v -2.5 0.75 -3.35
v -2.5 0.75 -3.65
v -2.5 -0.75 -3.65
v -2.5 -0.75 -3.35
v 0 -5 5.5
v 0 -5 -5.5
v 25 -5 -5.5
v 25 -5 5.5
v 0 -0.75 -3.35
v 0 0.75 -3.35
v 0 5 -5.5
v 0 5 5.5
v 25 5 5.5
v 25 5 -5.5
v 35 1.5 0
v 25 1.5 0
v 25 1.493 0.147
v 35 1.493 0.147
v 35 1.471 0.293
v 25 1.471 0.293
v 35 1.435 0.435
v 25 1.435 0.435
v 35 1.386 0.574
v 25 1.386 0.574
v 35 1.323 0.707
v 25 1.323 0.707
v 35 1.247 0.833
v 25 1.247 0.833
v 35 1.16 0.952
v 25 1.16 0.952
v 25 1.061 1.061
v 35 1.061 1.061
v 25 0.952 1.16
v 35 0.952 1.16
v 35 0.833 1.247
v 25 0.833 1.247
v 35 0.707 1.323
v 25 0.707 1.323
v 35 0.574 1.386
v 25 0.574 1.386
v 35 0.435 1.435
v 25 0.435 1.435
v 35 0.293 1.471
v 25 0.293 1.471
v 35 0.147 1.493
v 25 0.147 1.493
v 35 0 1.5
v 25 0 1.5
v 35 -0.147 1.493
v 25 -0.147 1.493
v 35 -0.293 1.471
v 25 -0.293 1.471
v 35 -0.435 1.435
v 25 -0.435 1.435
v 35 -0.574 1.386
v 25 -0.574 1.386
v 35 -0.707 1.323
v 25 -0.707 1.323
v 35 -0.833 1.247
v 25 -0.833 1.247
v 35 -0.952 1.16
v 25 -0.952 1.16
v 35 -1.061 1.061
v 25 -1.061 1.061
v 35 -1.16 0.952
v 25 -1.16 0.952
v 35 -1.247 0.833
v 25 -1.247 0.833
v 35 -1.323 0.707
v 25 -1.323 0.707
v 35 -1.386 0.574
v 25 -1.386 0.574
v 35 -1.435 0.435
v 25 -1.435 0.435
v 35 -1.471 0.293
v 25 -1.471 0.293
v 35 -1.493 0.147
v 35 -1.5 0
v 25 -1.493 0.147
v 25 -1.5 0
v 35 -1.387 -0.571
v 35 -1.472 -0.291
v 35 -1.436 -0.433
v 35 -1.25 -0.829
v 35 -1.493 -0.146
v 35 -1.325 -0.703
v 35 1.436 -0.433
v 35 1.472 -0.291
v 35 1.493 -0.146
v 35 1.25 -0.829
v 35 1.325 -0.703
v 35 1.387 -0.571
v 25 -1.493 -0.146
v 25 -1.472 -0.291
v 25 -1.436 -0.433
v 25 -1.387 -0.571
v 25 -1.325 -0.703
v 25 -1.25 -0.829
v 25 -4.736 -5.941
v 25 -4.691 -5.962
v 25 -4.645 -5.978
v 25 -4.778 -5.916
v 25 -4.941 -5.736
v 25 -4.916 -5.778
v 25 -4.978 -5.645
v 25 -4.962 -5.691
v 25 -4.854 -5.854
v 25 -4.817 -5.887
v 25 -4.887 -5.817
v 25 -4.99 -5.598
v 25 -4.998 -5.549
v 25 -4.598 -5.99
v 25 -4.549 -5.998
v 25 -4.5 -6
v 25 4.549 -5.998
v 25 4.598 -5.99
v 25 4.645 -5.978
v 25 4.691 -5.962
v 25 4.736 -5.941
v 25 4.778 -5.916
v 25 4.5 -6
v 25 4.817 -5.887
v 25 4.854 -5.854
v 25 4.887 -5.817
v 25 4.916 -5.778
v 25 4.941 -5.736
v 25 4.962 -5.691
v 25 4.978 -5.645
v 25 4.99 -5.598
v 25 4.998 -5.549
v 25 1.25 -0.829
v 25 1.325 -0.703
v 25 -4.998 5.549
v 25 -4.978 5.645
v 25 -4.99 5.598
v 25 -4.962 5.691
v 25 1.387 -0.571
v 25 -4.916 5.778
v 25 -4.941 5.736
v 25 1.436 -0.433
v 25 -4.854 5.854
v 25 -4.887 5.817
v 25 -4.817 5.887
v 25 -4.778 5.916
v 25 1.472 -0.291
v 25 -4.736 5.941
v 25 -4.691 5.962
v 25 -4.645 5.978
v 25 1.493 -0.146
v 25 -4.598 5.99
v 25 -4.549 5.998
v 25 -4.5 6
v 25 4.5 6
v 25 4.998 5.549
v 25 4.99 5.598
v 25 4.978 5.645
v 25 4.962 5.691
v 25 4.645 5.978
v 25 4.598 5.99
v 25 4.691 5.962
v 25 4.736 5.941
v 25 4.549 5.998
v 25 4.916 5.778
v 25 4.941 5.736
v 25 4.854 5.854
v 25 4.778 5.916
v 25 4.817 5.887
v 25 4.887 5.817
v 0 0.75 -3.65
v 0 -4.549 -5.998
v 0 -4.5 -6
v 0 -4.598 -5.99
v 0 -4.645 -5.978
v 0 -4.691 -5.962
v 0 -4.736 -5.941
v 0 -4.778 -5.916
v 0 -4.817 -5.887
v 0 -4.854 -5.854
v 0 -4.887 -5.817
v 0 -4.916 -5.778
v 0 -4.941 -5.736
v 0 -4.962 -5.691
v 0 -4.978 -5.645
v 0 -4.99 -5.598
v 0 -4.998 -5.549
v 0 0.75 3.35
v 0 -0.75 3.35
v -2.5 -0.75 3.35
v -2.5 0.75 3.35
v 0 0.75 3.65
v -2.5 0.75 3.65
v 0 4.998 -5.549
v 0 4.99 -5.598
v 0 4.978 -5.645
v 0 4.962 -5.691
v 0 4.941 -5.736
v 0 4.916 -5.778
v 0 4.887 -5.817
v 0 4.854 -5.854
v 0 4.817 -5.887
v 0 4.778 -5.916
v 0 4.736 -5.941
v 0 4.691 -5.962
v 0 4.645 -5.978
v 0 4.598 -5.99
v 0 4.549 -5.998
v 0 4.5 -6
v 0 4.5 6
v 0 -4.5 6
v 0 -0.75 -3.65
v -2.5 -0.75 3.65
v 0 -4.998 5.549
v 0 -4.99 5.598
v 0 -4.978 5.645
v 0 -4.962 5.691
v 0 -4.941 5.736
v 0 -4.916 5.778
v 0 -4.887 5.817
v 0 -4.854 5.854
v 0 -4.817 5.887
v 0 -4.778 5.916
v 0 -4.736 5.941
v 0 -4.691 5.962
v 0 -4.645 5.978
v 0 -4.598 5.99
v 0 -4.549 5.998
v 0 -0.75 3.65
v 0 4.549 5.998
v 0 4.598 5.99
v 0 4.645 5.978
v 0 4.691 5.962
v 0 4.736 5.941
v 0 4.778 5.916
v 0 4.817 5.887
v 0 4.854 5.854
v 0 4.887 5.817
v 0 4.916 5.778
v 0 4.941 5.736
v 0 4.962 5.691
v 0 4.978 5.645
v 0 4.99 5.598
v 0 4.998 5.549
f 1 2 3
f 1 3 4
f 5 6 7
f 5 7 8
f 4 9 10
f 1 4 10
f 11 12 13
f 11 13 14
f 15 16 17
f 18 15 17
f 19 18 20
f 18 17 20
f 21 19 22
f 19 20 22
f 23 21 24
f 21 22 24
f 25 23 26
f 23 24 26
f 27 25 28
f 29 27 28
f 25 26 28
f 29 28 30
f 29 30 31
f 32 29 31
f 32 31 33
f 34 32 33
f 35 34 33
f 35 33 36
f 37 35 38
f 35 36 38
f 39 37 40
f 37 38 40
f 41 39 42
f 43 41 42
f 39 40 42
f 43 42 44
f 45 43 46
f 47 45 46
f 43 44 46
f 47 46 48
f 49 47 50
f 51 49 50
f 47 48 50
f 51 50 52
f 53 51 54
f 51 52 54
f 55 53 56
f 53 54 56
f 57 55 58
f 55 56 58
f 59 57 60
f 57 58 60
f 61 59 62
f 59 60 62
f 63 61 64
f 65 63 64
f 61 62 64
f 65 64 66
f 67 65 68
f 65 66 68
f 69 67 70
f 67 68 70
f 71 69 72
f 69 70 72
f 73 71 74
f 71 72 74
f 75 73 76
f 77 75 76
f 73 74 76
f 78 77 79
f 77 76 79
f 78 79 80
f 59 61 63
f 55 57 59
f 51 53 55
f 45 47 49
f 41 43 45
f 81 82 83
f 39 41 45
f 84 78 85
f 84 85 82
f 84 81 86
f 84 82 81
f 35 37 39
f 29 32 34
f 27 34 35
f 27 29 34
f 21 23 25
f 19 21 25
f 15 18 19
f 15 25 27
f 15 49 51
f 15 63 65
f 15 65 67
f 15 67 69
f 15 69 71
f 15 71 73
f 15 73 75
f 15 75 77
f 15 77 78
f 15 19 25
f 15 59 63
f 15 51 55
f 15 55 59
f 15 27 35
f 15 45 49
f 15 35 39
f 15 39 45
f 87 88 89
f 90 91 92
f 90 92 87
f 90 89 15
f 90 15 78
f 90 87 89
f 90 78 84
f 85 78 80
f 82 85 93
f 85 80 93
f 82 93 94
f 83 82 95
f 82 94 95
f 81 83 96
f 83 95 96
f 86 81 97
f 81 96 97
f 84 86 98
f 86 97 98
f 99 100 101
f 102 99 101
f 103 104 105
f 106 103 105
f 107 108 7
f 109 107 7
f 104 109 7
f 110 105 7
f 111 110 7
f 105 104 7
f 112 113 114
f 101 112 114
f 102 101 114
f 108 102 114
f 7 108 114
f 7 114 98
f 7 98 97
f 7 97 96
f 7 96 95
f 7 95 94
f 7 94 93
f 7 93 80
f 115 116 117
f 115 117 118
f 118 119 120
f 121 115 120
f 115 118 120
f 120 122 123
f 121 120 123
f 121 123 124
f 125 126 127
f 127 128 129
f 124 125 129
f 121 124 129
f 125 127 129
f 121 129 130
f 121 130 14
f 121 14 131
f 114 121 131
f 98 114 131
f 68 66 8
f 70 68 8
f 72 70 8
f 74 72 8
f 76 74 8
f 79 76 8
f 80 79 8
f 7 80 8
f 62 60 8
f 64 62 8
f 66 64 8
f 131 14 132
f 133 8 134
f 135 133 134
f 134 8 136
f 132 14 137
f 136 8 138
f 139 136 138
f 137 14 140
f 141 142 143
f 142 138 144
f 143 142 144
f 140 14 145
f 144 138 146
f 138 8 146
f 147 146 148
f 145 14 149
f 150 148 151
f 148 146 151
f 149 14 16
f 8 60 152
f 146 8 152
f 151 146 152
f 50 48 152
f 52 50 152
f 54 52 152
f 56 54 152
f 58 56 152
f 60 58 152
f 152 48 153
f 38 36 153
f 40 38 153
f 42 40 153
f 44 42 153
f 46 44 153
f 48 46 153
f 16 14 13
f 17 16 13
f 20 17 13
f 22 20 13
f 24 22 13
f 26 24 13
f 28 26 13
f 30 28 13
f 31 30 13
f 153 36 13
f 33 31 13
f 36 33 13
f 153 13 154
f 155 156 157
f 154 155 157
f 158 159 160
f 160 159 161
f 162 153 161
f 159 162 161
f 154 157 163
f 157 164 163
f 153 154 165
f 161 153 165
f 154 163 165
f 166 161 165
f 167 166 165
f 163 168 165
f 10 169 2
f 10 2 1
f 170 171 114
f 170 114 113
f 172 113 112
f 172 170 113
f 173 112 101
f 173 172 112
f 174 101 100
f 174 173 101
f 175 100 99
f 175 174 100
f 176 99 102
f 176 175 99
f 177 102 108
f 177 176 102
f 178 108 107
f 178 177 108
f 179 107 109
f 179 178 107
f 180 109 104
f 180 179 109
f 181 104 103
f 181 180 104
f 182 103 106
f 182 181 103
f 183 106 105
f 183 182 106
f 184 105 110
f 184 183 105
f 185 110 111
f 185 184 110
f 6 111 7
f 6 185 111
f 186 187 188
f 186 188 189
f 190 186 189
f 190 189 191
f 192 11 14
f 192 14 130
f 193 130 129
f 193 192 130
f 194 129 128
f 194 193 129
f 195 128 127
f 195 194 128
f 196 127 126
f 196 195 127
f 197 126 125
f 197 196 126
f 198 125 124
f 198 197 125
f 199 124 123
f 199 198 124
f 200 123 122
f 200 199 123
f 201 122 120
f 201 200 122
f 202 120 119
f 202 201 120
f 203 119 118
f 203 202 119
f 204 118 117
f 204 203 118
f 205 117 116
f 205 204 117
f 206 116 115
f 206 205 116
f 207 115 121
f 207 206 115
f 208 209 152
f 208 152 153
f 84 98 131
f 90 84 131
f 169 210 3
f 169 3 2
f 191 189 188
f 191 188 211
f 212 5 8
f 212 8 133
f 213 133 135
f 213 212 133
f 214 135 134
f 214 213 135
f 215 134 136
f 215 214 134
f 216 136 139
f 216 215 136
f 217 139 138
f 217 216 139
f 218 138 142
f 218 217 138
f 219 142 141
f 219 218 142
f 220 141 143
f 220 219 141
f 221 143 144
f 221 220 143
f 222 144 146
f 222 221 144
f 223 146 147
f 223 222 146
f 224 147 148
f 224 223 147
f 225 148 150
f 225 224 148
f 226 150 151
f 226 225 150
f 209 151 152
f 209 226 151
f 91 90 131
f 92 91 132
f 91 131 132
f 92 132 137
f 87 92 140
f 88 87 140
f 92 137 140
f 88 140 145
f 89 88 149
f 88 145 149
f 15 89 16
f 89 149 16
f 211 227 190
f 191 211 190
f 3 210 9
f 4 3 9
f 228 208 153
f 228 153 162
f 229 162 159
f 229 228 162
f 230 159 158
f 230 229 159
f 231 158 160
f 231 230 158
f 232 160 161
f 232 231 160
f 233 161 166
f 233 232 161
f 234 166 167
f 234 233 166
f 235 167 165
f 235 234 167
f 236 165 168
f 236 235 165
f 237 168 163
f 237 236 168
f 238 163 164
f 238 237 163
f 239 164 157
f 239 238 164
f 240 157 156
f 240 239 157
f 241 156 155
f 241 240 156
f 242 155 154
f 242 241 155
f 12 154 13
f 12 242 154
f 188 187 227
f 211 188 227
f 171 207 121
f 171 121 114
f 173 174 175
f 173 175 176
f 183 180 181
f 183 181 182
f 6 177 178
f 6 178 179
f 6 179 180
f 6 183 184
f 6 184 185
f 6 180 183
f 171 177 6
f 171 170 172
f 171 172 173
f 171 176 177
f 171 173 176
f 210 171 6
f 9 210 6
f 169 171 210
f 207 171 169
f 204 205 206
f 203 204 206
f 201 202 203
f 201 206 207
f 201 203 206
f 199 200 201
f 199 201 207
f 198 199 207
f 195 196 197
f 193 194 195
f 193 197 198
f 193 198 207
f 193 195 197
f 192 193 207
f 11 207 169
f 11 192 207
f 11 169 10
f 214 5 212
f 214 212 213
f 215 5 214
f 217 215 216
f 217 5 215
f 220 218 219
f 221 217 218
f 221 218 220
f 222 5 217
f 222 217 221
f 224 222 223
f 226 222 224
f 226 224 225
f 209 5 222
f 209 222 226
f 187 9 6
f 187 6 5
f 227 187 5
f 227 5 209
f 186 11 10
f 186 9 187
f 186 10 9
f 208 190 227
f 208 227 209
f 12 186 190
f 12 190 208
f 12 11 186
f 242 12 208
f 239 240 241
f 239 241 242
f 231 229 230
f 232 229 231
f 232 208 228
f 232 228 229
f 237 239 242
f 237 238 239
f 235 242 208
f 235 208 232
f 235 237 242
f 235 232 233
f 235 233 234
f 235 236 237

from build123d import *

# Parameters (mm, degrees)
EXTRUDE_1_DEPTH = 25
EXTRUDE_2_DEPTH = 10
SKETCH_3_W      = 0.3
SKETCH_3_H      = 1.5
EXTRUDE_3_DEPTH = 2.5


with BuildPart() as part:
    # 草图1 → 凸台-拉伸1 (new body)
    with BuildSketch(Plane(origin=(0, 0, 0), x_dir=(0, 0, -1), z_dir=(1, 0, 0))):
        with BuildLine():
            Line((-5.5, 5), (5.5, 5))
            ThreePointArc((5.5, 5), (5.853553391, 4.853553391), (6, 4.5))
            Line((6, 4.5), (6, -4.5))
            ThreePointArc((6, -4.5), (5.853553391, -4.853553391), (5.5, -5))
            Line((5.5, -5), (-5.5, -5))
            ThreePointArc((-5.5, -5), (-5.853553391, -4.853553391), (-6, -4.5))
            Line((-6, -4.5), (-6, 4.5))
            ThreePointArc((-6, 4.5), (-5.853553391, 4.853553391), (-5.5, 5))
        make_face()
    extrude(amount=EXTRUDE_1_DEPTH)

    # 草图2 → 凸台-拉伸2 (add)
    with BuildSketch(Plane(origin=(25, 0, 0), x_dir=(0, 0, -1), z_dir=(1, 0, 0))):
        with BuildLine():
            ThreePointArc((0.829156198, 1.25), (0.433012702, 1.436140662), (0, 1.5))
            Line((0, 1.5), (0, -1.5))
            ThreePointArc((0, -1.5), (0.433012702, -1.436140662), (0.829156198, -1.25))
            Line((0.829156198, -1.25), (0.829156198, 1.25))
        make_face()
        with BuildLine():
            Line((0, -1.5), (0, 1.5))
            ThreePointArc((0, 1.5), (-1.5, 0), (0, -1.5))
        make_face()
    extrude(amount=EXTRUDE_2_DEPTH)

    # 草图3 → 凸台-拉伸3 (add)
    with BuildSketch(Plane.ZY):
        with Locations((-3.5, 0)):
            Rectangle(SKETCH_3_W, SKETCH_3_H)
        with Locations((3.5, 0)):
            Rectangle(SKETCH_3_W, SKETCH_3_H)
    extrude(amount=EXTRUDE_3_DEPTH)


solid = part.part
